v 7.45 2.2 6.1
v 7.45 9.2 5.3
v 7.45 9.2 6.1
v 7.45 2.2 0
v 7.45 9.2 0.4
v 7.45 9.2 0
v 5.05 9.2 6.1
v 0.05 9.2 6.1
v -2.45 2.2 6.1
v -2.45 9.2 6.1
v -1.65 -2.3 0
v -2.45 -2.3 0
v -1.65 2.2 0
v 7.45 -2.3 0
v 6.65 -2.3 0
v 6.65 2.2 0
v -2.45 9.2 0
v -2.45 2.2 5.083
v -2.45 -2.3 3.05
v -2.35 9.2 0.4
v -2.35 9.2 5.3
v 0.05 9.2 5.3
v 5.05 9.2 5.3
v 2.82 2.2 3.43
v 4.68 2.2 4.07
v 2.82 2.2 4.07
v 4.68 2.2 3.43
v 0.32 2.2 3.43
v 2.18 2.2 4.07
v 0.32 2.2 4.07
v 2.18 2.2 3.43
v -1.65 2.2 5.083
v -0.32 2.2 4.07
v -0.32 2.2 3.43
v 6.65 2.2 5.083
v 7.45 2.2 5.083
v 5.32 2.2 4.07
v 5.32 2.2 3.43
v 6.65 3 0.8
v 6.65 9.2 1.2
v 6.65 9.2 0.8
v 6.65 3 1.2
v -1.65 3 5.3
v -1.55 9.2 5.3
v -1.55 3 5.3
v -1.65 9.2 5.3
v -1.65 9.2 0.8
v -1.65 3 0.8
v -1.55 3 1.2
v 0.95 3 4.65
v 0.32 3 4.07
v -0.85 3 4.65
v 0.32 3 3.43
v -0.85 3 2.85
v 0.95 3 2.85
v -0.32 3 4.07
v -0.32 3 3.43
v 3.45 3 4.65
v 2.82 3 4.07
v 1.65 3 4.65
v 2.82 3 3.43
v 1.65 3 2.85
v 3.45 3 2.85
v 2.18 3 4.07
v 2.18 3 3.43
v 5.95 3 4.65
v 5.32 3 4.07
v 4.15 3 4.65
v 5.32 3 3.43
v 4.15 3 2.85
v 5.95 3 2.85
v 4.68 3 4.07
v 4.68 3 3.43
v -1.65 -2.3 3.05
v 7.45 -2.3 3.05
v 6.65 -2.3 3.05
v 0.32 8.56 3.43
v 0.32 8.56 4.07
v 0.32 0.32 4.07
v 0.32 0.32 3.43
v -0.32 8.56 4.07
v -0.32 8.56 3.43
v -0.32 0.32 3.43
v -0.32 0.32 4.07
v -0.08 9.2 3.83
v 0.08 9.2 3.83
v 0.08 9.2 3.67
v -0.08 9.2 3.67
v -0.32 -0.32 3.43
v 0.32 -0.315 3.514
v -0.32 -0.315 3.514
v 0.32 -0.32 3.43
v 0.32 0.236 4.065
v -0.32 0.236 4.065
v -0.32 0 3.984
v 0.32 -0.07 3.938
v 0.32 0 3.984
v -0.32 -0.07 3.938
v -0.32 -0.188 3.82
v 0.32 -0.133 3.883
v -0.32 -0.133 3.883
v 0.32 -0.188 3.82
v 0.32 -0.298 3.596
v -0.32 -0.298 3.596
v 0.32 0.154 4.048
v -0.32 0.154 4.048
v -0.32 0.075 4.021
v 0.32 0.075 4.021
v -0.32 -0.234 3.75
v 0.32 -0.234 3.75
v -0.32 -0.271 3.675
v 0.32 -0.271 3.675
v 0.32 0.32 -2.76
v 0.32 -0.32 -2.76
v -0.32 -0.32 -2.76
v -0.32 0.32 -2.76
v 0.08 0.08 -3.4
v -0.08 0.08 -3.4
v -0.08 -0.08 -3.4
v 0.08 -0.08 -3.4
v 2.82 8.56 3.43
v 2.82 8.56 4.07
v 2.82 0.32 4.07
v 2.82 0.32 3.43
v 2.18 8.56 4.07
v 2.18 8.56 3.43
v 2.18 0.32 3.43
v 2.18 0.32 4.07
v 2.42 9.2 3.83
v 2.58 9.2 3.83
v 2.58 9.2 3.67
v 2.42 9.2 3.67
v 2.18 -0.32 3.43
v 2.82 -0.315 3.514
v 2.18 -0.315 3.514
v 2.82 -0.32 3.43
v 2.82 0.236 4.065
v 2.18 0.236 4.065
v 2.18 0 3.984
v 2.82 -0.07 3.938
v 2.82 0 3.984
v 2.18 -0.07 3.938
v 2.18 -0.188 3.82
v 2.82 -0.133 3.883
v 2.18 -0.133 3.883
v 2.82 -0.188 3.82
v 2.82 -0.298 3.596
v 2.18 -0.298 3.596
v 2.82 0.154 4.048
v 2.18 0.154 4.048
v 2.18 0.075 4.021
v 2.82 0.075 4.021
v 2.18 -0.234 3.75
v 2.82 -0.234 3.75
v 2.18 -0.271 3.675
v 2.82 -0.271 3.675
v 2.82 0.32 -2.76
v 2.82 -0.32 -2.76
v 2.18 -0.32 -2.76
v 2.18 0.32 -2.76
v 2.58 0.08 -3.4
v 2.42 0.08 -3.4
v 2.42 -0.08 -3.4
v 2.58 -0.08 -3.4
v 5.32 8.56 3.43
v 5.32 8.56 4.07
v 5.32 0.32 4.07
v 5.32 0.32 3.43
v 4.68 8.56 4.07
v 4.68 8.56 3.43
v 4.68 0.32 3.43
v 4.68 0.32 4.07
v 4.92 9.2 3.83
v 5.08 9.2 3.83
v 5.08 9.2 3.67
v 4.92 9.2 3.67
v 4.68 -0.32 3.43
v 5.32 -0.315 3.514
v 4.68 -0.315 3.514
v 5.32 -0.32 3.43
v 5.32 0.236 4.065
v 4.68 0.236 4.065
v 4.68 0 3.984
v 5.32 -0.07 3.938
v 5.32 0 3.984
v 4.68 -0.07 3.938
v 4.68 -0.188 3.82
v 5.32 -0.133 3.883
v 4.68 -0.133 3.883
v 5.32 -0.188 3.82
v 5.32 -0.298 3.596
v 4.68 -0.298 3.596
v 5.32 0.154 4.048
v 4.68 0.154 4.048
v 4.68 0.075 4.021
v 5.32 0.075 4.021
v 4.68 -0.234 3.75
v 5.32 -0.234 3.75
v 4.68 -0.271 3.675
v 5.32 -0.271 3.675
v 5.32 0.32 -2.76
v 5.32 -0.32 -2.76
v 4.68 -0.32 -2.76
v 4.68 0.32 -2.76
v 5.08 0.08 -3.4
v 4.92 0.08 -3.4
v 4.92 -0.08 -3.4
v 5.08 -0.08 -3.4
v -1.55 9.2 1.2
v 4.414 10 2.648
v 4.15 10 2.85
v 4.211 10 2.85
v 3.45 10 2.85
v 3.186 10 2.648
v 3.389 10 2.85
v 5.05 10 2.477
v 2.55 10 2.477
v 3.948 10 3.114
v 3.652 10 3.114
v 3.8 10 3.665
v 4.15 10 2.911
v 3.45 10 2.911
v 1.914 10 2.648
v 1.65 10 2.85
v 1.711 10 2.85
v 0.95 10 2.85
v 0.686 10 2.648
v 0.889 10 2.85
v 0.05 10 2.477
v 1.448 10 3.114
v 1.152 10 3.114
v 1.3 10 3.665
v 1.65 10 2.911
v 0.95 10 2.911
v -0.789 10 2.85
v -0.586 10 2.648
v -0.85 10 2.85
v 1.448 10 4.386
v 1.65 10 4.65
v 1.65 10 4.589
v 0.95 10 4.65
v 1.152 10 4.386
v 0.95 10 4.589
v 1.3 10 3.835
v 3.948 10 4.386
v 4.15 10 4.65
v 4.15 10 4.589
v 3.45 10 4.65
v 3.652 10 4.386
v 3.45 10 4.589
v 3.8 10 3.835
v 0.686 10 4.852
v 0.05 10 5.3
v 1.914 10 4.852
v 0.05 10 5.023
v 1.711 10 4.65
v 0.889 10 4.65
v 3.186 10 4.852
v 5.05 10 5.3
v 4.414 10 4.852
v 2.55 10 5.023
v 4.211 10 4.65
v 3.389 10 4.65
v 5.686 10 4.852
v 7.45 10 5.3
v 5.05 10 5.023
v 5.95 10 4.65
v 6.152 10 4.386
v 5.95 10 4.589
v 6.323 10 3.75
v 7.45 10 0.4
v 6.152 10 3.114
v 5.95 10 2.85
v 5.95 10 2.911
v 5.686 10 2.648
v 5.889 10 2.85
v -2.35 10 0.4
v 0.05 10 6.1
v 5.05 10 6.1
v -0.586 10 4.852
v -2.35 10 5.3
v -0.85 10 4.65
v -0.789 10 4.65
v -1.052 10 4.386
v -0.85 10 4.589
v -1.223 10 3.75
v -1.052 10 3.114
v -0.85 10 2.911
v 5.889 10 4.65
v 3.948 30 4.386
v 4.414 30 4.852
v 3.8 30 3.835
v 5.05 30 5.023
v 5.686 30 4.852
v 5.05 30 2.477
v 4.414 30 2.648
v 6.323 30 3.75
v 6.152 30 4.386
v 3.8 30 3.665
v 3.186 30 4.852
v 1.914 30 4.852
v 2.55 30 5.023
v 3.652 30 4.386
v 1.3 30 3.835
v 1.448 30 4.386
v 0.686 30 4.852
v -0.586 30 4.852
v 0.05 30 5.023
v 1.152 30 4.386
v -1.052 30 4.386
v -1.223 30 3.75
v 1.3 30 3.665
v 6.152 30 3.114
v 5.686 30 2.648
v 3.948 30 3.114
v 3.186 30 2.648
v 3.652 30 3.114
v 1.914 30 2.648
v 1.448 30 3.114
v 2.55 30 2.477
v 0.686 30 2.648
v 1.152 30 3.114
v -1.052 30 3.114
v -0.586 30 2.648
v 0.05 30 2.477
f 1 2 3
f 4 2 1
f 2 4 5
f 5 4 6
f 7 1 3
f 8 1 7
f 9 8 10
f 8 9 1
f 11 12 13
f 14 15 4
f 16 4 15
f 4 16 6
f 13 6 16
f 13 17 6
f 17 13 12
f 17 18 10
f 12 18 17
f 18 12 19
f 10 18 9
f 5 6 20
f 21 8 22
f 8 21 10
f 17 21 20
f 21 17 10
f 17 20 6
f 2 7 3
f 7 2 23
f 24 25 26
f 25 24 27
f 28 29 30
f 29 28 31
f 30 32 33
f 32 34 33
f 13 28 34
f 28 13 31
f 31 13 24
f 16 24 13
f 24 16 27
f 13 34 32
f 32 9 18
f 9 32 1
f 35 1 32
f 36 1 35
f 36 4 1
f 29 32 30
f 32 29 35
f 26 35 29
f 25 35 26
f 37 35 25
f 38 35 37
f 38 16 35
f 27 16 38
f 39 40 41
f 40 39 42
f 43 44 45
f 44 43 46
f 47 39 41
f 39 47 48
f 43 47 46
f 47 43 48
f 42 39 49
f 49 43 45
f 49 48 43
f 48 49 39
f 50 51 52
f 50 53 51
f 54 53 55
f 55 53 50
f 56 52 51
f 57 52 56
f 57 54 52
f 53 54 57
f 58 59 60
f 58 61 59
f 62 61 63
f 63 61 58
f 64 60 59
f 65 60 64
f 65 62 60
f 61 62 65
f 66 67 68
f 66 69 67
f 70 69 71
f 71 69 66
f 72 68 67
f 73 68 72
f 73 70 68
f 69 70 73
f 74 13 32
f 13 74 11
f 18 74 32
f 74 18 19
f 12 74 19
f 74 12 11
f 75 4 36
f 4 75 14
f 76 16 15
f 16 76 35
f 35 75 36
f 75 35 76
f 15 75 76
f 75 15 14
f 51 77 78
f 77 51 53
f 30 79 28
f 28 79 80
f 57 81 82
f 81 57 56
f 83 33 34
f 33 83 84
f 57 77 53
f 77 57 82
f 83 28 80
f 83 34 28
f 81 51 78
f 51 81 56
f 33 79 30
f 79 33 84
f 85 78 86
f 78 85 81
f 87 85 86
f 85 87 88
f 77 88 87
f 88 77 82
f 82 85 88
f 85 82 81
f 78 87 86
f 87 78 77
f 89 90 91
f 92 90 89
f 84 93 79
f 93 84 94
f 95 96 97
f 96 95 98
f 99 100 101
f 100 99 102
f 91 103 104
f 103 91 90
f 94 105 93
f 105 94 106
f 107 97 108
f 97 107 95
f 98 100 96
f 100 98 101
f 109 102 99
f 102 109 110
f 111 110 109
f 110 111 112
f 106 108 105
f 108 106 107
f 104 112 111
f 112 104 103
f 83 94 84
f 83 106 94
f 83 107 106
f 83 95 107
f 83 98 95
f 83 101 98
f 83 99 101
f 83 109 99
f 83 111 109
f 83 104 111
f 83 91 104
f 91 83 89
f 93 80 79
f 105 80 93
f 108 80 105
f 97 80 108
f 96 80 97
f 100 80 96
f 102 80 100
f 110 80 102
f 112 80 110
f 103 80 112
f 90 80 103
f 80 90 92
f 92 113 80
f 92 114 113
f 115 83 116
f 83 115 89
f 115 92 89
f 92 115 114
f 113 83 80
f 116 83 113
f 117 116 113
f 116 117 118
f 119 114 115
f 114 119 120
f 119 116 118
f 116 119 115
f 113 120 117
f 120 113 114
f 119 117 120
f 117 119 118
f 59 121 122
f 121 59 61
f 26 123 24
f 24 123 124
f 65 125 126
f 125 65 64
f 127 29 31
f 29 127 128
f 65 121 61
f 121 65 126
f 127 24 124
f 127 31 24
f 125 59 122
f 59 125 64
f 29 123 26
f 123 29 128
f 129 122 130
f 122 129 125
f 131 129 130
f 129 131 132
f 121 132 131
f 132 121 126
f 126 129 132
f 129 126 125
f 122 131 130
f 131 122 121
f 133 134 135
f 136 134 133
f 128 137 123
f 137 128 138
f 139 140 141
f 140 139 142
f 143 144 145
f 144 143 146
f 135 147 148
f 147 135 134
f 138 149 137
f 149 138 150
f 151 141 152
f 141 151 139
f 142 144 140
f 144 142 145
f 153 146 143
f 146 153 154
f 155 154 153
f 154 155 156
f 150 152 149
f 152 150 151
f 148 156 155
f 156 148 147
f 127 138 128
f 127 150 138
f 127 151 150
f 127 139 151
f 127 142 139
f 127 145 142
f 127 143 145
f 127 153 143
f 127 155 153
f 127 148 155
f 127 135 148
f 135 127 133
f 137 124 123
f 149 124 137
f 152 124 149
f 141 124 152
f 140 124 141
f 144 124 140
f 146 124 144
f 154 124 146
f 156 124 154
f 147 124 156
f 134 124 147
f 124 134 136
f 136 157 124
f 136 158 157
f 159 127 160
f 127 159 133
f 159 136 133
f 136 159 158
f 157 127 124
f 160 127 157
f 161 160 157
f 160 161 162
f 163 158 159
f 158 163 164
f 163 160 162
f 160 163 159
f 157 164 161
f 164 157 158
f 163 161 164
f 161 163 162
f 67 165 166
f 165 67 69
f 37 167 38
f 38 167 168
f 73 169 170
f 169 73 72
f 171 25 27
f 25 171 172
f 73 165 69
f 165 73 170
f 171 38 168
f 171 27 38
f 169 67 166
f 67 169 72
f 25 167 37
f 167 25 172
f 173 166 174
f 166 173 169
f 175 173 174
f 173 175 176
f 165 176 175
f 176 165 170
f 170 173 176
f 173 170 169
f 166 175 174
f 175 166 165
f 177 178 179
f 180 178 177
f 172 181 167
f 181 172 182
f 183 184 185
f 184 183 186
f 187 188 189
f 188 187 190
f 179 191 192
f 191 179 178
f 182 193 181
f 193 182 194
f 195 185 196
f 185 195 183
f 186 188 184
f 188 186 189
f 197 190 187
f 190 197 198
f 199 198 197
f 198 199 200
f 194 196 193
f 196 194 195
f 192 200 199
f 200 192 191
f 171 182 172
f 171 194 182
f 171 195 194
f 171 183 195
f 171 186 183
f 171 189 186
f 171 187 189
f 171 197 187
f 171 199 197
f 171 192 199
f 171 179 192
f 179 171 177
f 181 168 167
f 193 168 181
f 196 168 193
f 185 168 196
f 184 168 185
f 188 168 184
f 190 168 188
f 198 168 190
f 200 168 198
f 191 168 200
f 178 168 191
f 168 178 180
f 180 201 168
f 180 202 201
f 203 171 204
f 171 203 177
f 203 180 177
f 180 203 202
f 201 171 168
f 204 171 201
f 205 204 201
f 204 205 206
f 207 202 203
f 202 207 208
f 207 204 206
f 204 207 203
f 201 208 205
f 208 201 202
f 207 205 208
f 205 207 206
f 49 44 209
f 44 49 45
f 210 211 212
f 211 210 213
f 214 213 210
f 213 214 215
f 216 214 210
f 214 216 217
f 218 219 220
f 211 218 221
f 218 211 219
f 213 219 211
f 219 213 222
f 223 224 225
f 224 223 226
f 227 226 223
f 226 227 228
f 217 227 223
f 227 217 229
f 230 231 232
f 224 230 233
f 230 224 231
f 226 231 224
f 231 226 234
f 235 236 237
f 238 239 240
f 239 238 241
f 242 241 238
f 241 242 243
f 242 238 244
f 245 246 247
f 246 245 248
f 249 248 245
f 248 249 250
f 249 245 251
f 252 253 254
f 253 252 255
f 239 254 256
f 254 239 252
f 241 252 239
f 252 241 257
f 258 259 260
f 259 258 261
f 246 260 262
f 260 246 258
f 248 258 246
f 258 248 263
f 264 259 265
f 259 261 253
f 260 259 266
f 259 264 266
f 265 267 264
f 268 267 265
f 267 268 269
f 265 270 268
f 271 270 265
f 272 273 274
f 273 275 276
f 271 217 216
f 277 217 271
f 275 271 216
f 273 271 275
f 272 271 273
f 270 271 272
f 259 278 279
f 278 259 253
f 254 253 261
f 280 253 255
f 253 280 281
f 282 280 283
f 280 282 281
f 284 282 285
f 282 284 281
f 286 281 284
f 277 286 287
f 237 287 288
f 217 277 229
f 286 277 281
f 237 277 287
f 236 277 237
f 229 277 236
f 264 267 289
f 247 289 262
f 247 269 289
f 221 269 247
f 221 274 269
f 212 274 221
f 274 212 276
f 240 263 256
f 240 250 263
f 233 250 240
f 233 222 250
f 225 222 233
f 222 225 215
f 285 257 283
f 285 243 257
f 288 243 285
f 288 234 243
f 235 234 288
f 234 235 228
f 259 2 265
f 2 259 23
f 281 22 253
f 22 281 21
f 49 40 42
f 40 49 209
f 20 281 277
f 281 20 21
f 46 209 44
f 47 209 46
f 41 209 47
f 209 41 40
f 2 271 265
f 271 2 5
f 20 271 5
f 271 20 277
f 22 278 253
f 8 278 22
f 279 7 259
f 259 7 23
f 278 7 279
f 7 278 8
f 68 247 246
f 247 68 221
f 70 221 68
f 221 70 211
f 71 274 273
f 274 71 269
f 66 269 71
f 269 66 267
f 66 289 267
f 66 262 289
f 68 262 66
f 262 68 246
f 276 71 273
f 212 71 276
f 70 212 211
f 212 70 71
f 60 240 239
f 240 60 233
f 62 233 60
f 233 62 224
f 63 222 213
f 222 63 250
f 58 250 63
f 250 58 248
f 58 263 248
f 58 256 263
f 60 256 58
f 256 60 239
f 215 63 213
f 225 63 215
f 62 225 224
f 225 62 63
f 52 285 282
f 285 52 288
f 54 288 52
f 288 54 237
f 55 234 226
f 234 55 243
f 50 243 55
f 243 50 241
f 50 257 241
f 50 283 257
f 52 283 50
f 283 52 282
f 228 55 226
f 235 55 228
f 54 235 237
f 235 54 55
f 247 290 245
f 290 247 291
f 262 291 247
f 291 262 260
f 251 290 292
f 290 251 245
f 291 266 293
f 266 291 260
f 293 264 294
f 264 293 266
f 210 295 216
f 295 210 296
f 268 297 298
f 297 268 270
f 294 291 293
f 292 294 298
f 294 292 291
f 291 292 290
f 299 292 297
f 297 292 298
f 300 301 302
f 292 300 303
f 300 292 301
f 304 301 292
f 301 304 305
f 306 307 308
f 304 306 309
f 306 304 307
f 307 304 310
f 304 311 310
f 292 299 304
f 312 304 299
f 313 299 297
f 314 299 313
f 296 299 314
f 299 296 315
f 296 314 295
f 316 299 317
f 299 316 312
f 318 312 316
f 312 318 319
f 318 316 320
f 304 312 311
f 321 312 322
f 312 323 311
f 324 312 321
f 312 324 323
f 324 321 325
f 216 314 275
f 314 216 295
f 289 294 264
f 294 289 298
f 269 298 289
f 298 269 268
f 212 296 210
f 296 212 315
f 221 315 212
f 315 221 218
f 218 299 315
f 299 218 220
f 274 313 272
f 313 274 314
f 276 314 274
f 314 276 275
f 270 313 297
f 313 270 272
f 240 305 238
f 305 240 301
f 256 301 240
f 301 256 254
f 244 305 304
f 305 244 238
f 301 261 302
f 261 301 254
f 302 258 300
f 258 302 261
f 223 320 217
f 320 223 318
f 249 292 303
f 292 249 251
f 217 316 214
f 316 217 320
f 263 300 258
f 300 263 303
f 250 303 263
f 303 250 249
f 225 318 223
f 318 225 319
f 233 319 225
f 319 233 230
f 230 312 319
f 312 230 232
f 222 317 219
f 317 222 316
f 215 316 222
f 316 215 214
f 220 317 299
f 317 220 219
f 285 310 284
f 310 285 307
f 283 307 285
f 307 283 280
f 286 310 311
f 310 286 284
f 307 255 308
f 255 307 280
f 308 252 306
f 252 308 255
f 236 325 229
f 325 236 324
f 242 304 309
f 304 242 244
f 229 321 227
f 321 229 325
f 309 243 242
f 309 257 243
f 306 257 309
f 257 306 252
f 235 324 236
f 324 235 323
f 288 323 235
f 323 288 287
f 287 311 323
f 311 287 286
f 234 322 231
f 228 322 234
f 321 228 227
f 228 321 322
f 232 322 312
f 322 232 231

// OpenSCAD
// file: ../../lib/pins.scad
/*
    Pins Lib
    
    Variety of pins for connectors
*/

use <geometric.scad>

/*
    Bend
    
    Right angle bend in a cuboid.
    Centered on (0,0)
    Open sides face +Y and +Z
    
    x - Size in X
    yz - Size in Y and Z
*/
module bend(x, yz){
    rotate([180,0,0])
      rotate([0,-90,0])
        translate([-yz/2,-yz/2,-x/2]){
            intersection(){
                rotate_extrude(angle=90, $fn=48)
                  square([yz, x]);
                cube([yz,yz,x]);
            }
        }
}

/*
    Straight Pin

    Standard straight pin with chiseled tip
    Centered on (0,0), base rests on XY plane, tip points upwards

    l - Length of pin
    wx - Width in X
    wy - Width in Y
*/
module pin(l, wx, wy){
    apex_h = (wx+wy)/2;
    rem_h = l-apex_h;
    translate([0,0,rem_h/2]) cube([wx,wy,rem_h], true);
    translate([0,0,rem_h]) sq_pyr(wx, wy, apex_h, 0.25);
}

/*
    Right angled pin

    Right angled pin with chiseled tips
    Right angle bend centered on (0,0,0) pin extends along +Y and -Z.

    l - Length of pin along +Y
    h - Height of pin along -Z
    wx - Pin Width in X
    wy - Pin Width in Y (Z for horizontal part)
*/
module r_pin(l, h, wx, wy){
    l_t = l-wy/2;
    h_t = h-wy/2;
    rotate([-90,0,0]){
        translate([0,0,wy/2]) pin(l_t,wx,wy);
        bend(wx,wy);
    }
    translate([0,0,-wy/2]) rotate([180,0,0]) pin(h_t,wx,wy);
}
// file: ../../lib/geometric.scad
/*
    ~Geometric Lib
    
    Variety of geometric parts
*/

/*
    On plane cube
    
    Cube that is centered in X and Y and rests on the XY plane
    
    size - as cube
*/
module tcube(size){
    translate([0,0,size[2]/2]) cube(size, true);
}

/*
    Square based frustrated pyramid

    Centered on X and Y, rests on the XY plane

    w - Width in X
    d - Depth in Y
    h - Height in Z
    ratio - Ratio of size of the tip face to the base face
*/
module sq_pyr(w, d, h, ratio){
    resize([w,d,h]) rotate([0,0,45]){
        cylinder(h, d1=1, d2=ratio, $fn=4);
    }
}

/*
    Rounded cornered box

    Centered on X and Y, rests on the XY plane

    w - Width in X
    d - Depth in Y
    h - Height in Z
    cr - Corner ratio
*/
module rounded_box(w,d,h,cr){
    translate([0,0,h/2]) {
        minkowski() {
            cube([w-2*cr, d-2*cr, h/2], true);
            cylinder(h/2, cr, cr, true, $fn=12);
        }
    }
}

module wedge(w,d,h){
    resize([w,d,h])
      translate([1,0,0])
        rotate([0,-90,0])
          linear_extrude(1)
            polygon([[0,0],[0,1],[1,0]]);
}


module fwedge(w,d,h,td){
    wedge_d = (d-td)/2;
    translate([0,wedge_d,0]){
        translate([0,td,0])
          wedge(w,wedge_d,h);
        cube([w,td,h]);
        mirror([0,1,0])
          wedge(w,wedge_d,h);
    }
}
// main file
/*
    JST XH

    Openscad models for various JST XH connctor elements.

    Currently covered:
    * XHP-xx plug with flying leads
    * SxxB-XH-A right angle socket
*/
use <../../lib/geometric.scad>
use <../../lib/pins.scad>

module JST_XHP_xx(N, A, B, C){
    HEIGHT = 7.75;
    INNER_DEPTH = 4.1;
    OUTER_DEPTH = 5.7;
    
    WALL = (OUTER_DEPTH-INNER_DEPTH)/2;
    
    SIDE = (C-A)/2;
    
    HOLE_DIAM = 1.8;
    HOLE_DROP = 2.35;
    
    difference(){
        union(){
            translate([WALL,WALL,0])
              cube([B,INNER_DEPTH,HEIGHT]);
            translate([0,0,HEIGHT-WALL])
              cube([C,INNER_DEPTH+WALL,WALL]);
            translate([SIDE,INNER_DEPTH+WALL,HEIGHT-WALL])
              cube([A,WALL,WALL]);
        }
        for (i=[0:A/(N-1):A]){
            translate([SIDE+i-(HOLE_DIAM/2),
                       OUTER_DEPTH-HOLE_DROP-(HOLE_DIAM/2),
                       0]){
                cube([HOLE_DIAM,HOLE_DIAM,HEIGHT]);
            }
        }
    }
    corner = sqrt(2*HOLE_DIAM*HOLE_DIAM)/2;
    for (i=[0:A/(N-1):A]){
        translate([SIDE+i,
                   OUTER_DEPTH-HOLE_DROP,
                   HEIGHT]){
            cylinder(20,corner,corner,$fn=12);
        }
    }
}

module JST_SxxB_XH_A(N, A, B){
    HEIGHT = 6.1;
    DEPTH = 11.5;
    DEPTH_NO_TAG = 7.0;
    WALL = 0.8;
    
    PIN_DROP = 2.35;
    PIN_LEN = 9.2;
    PIN_DEPTH = 3.4;
    PIN_DIAM = 0.64;
    
    INNER_W = B-(WALL*2);
    INNER_D = DEPTH_NO_TAG-WALL;
    INNER_H = HEIGHT-(WALL*2);
    
    TAG_DEPTH = DEPTH-DEPTH_NO_TAG;
    
    PIN_SIDE = (B-A)/2;
    
    translate([-PIN_SIDE,PIN_LEN-DEPTH_NO_TAG,0]){
        difference(){
            cube([B,DEPTH_NO_TAG,HEIGHT]);
            translate([WALL,WALL,WALL])
              cube([INNER_W,INNER_D,INNER_H]);
        }
        for (i = [0, B-WALL]){
            translate([i,-TAG_DEPTH,0]){
                translate([0,TAG_DEPTH,HEIGHT*3/6])
                    mirror([0,1,0])
                        wedge(WALL,
                              TAG_DEPTH,
                              HEIGHT*2/6);
                cube([WALL,TAG_DEPTH,HEIGHT*3/6]);
            }
        }
    }
    translate([0,0,HEIGHT-PIN_DROP]){
        for (i = [0:A/(N-1):A]){
            translate([i,0,0])
                r_pin(PIN_LEN,
                      HEIGHT-PIN_DROP+PIN_DEPTH,
                      PIN_DIAM,
                      PIN_DIAM);
        }
    }
}

render(){
    JST_SxxB_XH_A(3,5.0,9.9);
    translate([9.9-2.45,1.45+0.8,0.4])
    rotate([-90,0,0])
    rotate([0,0,180])
      JST_XHP_xx(3, 5.0, 8.2, 9.8);
}
